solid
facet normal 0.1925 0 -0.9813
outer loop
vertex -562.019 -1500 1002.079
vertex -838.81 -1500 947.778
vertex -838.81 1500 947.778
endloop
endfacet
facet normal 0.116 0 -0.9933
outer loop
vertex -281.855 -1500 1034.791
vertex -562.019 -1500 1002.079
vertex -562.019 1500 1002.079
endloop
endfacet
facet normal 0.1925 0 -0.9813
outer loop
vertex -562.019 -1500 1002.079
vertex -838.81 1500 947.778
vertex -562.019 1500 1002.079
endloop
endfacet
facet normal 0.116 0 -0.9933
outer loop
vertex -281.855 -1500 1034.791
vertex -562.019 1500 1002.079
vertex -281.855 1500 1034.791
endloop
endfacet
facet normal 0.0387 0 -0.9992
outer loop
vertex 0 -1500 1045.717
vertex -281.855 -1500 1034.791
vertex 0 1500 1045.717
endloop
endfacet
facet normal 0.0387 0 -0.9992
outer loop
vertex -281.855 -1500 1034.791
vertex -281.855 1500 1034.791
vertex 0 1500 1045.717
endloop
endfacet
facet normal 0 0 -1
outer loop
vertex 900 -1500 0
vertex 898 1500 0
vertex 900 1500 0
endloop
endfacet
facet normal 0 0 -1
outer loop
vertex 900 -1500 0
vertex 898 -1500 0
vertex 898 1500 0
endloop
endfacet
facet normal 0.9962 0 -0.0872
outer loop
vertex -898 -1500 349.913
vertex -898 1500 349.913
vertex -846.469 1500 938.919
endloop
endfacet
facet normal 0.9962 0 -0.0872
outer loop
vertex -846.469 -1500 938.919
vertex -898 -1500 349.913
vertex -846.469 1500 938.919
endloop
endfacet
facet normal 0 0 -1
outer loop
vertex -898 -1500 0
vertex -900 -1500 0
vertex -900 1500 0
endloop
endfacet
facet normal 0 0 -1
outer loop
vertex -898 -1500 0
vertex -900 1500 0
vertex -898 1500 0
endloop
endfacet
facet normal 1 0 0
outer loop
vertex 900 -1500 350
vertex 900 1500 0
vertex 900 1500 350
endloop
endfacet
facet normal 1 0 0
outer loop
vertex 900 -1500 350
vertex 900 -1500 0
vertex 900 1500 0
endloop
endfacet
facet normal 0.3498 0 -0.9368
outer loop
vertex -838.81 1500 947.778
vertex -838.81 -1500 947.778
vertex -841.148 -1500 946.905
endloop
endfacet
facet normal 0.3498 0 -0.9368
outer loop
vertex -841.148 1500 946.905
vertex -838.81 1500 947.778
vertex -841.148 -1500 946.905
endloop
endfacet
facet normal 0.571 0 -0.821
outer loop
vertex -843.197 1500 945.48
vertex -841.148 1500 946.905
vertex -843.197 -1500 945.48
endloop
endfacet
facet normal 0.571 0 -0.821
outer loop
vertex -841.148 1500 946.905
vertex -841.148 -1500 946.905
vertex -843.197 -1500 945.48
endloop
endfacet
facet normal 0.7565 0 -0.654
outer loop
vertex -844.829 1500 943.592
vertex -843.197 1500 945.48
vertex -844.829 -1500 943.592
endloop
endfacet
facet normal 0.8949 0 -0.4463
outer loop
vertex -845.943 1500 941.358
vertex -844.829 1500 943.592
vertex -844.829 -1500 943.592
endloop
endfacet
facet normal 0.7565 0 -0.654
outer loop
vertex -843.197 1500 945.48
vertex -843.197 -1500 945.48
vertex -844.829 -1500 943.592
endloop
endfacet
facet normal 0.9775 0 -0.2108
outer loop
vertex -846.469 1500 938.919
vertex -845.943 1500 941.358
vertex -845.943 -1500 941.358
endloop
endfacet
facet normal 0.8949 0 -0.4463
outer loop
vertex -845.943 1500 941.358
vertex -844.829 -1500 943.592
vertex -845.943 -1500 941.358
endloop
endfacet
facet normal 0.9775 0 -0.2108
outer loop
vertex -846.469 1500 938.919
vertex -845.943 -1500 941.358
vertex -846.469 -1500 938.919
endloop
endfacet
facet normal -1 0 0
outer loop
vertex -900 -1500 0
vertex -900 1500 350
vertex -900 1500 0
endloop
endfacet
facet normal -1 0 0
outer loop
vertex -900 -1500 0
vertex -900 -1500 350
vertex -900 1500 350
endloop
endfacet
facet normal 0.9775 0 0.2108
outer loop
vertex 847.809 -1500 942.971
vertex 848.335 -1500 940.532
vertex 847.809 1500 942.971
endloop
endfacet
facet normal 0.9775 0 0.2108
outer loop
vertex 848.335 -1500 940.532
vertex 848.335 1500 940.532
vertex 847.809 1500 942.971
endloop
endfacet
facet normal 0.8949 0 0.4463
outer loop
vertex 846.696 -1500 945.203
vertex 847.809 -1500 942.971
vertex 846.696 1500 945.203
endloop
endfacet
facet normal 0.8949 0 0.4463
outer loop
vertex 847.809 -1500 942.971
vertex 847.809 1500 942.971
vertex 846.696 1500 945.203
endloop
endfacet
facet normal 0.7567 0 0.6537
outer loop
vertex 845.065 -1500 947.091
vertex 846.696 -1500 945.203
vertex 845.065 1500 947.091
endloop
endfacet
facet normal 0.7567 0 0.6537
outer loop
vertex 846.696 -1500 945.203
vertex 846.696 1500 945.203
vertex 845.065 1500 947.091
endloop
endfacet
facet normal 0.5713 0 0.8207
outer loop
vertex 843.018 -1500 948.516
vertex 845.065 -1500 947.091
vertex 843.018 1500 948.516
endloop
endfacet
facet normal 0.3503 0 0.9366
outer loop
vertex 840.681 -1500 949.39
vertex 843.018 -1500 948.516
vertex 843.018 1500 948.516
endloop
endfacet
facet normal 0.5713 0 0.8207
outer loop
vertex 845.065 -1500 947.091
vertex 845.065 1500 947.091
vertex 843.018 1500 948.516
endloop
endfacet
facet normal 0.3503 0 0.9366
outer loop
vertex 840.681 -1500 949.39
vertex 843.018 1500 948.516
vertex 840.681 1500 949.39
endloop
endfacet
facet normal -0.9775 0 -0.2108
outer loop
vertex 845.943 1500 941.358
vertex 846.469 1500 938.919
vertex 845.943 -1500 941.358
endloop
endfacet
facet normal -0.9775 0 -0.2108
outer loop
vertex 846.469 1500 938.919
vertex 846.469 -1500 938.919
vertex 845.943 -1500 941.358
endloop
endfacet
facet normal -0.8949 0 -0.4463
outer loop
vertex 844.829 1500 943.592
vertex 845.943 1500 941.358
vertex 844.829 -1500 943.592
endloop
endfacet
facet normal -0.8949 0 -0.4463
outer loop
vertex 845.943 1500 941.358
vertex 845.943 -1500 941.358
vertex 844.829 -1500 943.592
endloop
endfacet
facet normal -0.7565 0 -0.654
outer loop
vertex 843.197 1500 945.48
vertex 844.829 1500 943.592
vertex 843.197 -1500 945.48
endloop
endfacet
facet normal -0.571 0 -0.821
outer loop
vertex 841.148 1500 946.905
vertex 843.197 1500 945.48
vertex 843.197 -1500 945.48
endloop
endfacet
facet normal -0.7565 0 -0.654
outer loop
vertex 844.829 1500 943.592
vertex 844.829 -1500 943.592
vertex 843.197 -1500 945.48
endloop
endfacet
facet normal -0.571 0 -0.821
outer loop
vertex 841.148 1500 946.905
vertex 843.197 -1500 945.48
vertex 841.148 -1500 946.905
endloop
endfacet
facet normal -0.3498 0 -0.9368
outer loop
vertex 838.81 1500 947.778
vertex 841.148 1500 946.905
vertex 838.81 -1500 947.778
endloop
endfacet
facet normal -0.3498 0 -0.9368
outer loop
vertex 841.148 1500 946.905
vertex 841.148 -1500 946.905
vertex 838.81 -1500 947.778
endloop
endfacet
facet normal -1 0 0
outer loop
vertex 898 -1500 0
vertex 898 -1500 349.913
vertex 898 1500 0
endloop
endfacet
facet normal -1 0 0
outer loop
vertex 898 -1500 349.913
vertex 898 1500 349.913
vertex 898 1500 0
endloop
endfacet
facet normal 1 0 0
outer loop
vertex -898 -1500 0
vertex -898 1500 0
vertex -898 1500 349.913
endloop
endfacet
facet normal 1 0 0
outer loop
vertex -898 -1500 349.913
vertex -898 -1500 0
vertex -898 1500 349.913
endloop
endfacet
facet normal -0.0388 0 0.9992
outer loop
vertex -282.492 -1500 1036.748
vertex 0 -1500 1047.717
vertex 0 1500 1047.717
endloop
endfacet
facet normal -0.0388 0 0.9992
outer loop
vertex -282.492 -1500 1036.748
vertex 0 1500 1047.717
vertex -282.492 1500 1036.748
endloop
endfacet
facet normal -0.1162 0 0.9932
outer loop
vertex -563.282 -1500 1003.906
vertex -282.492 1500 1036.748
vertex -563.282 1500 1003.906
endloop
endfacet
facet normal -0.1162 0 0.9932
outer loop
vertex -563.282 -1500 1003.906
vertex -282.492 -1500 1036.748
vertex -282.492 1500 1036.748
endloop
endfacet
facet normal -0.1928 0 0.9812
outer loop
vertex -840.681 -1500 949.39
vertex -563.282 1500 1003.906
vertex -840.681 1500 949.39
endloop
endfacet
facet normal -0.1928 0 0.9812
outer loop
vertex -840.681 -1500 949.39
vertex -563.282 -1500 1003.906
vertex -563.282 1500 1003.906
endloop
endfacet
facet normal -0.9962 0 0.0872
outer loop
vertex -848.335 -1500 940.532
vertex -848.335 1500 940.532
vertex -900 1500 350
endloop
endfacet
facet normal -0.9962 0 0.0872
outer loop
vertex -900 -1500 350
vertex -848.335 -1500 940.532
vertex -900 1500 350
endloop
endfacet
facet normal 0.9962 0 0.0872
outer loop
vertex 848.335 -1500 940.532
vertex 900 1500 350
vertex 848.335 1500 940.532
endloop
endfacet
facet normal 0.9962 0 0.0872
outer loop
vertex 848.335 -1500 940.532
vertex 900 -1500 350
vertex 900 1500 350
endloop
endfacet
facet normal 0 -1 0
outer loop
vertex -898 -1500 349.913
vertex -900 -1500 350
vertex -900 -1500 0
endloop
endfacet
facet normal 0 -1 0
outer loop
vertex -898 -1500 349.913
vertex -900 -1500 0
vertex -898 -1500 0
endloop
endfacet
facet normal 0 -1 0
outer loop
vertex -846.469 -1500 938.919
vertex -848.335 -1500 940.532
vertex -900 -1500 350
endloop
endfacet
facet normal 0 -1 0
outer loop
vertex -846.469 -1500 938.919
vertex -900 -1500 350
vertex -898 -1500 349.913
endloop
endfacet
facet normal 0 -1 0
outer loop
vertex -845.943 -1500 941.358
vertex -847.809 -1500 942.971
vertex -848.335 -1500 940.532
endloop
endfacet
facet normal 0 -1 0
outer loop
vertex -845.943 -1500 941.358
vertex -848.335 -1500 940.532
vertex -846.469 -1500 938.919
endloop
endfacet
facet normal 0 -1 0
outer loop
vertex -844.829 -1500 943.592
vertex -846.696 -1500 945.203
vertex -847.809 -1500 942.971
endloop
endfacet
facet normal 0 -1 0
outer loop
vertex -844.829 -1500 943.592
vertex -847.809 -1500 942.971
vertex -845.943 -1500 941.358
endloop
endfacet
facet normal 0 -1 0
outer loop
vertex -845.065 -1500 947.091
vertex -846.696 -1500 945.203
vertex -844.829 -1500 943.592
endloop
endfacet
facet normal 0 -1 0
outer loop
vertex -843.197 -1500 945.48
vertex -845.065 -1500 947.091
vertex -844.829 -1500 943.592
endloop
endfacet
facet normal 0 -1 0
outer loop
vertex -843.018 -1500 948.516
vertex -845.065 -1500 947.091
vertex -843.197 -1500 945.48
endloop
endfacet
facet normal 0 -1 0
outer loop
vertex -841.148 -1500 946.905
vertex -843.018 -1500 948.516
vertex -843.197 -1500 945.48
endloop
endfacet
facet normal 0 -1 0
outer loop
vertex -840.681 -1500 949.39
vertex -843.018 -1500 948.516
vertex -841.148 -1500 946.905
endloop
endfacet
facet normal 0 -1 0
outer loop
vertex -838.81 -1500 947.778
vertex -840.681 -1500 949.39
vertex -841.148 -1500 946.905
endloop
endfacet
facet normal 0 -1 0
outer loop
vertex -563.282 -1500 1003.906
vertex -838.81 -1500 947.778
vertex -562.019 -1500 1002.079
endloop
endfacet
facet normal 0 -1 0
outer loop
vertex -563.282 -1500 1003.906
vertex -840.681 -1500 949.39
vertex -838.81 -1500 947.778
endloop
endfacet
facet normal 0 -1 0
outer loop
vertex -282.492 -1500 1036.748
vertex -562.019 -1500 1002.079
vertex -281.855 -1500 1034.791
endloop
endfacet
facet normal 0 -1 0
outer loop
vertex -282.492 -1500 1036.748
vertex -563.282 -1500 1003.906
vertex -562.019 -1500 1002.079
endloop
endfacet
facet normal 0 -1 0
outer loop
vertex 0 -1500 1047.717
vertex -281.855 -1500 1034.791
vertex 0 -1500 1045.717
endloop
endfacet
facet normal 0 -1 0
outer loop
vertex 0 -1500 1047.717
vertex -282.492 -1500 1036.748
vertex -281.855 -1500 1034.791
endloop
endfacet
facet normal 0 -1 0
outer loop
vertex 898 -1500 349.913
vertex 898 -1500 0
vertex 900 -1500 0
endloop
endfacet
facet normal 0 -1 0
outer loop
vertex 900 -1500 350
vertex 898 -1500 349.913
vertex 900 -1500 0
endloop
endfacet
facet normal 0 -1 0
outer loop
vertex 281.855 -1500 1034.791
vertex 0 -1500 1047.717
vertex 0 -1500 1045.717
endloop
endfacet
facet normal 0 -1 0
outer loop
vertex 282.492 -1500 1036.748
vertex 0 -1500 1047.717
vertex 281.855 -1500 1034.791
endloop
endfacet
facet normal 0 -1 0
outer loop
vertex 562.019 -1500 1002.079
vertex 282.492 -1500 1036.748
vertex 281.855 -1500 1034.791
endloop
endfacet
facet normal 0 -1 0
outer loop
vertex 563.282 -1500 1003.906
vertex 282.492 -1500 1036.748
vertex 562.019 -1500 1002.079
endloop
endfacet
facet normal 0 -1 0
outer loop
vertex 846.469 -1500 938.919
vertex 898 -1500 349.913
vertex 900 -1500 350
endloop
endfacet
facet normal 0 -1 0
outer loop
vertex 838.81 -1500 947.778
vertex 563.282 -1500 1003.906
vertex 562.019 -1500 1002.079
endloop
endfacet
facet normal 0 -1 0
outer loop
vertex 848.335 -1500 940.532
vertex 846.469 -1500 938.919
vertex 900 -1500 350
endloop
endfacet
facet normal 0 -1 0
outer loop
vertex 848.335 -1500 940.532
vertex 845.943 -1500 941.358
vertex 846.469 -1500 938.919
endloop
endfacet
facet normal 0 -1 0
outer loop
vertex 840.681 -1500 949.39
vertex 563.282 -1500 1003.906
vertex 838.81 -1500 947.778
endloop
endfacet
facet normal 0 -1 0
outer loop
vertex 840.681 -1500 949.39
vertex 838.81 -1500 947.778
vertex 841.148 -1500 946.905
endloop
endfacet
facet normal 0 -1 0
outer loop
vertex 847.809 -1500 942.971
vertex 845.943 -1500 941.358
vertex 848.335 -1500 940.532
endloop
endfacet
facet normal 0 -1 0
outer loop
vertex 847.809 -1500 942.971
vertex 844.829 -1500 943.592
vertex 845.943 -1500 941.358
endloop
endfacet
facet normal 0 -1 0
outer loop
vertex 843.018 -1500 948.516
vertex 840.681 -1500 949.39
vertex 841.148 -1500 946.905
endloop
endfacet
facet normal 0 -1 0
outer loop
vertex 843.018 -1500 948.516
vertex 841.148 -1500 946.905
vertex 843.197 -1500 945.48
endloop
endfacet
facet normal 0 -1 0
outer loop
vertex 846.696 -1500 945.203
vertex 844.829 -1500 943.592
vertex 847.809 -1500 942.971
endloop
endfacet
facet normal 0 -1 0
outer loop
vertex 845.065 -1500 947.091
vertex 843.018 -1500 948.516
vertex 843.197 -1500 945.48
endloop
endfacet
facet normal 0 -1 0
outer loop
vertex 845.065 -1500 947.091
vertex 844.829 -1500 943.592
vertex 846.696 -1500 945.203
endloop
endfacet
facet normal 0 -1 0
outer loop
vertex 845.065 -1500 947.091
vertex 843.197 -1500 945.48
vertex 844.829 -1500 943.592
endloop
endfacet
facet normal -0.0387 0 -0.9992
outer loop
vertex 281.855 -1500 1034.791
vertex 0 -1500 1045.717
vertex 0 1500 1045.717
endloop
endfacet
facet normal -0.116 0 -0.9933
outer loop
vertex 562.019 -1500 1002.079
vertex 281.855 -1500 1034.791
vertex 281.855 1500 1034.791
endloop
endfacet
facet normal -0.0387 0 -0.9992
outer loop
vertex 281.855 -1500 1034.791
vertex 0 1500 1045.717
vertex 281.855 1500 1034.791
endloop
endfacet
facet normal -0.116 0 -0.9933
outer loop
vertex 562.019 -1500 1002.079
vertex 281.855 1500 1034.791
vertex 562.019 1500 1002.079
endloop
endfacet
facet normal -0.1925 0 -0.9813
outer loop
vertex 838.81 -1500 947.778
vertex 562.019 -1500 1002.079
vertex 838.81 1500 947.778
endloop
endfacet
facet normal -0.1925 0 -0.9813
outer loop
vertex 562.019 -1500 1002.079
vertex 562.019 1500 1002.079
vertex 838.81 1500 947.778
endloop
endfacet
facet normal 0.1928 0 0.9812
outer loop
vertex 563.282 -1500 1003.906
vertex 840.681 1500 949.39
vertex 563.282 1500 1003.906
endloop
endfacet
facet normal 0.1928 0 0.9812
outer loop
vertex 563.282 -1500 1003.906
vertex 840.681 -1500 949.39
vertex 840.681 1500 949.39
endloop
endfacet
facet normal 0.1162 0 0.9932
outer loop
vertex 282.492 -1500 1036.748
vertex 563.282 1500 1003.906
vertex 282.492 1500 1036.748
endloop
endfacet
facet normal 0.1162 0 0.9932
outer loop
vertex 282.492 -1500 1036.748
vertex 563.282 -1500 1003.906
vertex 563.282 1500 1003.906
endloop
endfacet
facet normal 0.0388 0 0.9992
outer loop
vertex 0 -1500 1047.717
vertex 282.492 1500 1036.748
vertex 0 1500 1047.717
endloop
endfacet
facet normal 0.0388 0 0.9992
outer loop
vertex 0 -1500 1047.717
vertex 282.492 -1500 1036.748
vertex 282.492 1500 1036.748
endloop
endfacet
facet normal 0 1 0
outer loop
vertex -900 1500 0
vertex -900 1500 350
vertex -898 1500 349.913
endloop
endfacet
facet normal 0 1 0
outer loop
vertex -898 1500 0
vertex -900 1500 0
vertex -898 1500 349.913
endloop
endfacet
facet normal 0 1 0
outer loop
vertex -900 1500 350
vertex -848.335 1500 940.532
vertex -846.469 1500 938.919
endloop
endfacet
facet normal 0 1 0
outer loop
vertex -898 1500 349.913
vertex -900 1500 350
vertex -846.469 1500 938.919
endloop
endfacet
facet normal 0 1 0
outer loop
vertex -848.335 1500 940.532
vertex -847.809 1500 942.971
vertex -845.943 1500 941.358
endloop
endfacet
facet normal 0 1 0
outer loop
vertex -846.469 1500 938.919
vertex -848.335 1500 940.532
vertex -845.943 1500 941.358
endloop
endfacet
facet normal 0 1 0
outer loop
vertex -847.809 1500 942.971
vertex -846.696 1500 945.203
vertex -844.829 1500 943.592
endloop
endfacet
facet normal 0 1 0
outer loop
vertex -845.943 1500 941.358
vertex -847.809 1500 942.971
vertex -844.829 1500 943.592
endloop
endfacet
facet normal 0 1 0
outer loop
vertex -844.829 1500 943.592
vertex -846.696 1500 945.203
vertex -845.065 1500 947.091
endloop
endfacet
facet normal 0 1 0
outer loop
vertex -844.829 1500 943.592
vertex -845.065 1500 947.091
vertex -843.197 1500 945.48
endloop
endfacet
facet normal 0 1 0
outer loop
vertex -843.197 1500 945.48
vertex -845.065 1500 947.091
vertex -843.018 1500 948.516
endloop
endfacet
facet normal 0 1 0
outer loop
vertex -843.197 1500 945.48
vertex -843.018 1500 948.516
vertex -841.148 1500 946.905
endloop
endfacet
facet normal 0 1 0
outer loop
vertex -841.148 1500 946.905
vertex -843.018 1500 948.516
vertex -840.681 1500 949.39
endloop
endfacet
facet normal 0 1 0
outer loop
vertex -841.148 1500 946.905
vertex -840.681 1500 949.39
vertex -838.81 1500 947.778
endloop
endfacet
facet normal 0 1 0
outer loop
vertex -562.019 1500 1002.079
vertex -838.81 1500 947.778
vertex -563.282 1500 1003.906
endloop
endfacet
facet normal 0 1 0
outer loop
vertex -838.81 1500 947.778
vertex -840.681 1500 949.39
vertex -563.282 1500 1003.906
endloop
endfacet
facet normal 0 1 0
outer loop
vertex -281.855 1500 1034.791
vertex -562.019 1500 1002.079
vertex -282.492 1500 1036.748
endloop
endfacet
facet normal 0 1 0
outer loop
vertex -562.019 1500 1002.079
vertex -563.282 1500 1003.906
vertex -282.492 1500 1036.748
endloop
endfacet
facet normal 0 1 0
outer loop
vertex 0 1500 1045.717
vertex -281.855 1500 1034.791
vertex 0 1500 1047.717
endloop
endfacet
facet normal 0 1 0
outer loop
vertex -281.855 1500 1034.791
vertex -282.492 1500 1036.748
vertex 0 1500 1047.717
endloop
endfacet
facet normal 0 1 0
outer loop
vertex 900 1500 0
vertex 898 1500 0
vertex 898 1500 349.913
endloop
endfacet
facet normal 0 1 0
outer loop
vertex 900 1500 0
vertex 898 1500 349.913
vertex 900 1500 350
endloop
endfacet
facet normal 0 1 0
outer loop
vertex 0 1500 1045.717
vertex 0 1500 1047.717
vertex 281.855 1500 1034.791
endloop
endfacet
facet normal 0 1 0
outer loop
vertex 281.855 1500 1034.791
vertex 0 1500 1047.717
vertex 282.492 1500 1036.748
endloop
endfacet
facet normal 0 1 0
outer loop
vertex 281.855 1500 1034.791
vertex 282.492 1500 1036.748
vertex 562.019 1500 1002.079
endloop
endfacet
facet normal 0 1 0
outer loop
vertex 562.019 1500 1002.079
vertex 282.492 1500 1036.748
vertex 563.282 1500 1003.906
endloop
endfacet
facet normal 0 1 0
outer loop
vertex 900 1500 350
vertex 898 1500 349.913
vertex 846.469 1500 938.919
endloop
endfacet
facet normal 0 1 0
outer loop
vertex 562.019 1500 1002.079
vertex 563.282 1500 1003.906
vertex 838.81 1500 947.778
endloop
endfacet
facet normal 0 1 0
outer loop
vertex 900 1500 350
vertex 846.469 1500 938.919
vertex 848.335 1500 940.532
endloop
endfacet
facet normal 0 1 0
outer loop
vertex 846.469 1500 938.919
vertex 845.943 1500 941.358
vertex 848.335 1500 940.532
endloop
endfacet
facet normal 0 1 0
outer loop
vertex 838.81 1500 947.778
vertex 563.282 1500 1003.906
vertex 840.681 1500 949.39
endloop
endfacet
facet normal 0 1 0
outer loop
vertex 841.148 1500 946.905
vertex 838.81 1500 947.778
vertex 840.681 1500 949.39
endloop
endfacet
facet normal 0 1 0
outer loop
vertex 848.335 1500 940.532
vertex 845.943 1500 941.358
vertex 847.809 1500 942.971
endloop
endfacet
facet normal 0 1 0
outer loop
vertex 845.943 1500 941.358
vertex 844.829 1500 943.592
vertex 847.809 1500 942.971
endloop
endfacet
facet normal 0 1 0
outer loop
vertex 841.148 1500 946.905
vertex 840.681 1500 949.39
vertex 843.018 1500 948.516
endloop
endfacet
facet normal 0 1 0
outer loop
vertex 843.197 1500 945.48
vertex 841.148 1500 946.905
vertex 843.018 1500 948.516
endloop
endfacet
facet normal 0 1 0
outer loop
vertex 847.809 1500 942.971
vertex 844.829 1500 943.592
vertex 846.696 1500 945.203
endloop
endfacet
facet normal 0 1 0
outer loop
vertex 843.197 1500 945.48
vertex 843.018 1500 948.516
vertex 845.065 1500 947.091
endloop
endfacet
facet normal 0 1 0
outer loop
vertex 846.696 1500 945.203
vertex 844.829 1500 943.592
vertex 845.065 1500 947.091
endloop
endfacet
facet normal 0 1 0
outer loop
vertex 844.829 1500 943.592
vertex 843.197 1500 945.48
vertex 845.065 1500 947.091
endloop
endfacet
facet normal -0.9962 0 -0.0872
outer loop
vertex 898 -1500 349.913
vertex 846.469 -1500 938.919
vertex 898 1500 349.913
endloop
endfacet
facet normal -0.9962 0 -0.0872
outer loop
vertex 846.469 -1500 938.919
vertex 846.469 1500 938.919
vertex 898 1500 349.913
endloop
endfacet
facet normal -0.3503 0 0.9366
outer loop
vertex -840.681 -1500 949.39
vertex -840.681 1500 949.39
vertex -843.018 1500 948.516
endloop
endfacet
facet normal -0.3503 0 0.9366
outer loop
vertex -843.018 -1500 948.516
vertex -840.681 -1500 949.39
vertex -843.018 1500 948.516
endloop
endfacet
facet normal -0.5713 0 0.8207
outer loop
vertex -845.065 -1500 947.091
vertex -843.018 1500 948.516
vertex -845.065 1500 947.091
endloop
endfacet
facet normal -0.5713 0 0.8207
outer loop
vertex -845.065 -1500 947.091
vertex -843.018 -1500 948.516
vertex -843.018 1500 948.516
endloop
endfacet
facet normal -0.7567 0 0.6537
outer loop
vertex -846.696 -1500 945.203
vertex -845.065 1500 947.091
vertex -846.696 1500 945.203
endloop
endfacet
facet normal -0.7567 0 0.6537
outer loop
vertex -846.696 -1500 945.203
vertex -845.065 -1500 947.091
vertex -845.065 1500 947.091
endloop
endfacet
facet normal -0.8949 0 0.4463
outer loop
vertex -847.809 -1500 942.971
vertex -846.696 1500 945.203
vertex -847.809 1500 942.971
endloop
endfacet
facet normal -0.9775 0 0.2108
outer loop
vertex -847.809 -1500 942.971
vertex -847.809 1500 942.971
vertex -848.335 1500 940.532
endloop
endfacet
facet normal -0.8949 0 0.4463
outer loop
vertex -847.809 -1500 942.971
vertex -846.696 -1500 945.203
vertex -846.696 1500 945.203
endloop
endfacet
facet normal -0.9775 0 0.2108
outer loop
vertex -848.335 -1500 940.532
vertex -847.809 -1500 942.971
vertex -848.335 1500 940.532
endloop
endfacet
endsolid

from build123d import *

# Parameters (mm, degrees)
F2_DEPTH      = 1500
F2_DEPTH_BACK = 1500
F3_R          = 10
F4_R          = 10
F5_R          = 10
F6_R          = 10


with BuildPart() as f2:
    # F1 (on Front) → F2 (new body, two sides)
    with BuildSketch(Plane.XZ) as f2_sk:
        with BuildLine():
            Line((-900, 350), (-900, 0))
            Line((-900, 0), (-898, 0))
            Line((-898, 0), (-898, 349.912678))
            Line((-898, 349.912678), (-845.83978, 946.106722))
            ThreePointArc((-845.83978, 946.106722), (-425.842431, 1020.728548), (0, 1045.716819))
            ThreePointArc((0, 1045.716819), (425.842431, 1020.728548), (845.83978, 946.106722))
            Line((845.83978, 946.106722), (898, 349.912678))
            Line((898, 349.912678), (898, 0))
            Line((898, 0), (900, 0))
            Line((900, 0), (900, 350))
            Line((900, 350), (847.706554, 947.716819))
            ThreePointArc((847.706554, 947.716819), (426.792222, 1022.630445), (0, 1047.716819))
            ThreePointArc((0, 1047.716819), (-426.792222, 1022.630445), (-847.706554, 947.716819))
            Line((-847.706554, 947.716819), (-900, 350))
        make_face()
    extrude(amount=F2_DEPTH)
    extrude(f2_sk.sketch, amount=-F2_DEPTH_BACK)

    # F3
    f3_edges = [f2.edges().sort_by_distance(p)[0] for p in [
        (-845.83978, 0, 946.106722),
    ]]
    fillet(f3_edges, radius=F3_R)

    # F4
    f4_edges = [f2.edges().sort_by_distance(p)[0] for p in [
        (-847.706554, 0, 947.716819),
    ]]
    fillet(f4_edges, radius=F4_R)

    # F5
    f5_edges = [f2.edges().sort_by_distance(p)[0] for p in [
        (847.706554, 0, 947.716819),
    ]]
    fillet(f5_edges, radius=F5_R)

    # F6
    f6_edges = [f2.edges().sort_by_distance(p)[0] for p in [
        (845.83978, 0, 946.106722),
    ]]
    fillet(f6_edges, radius=F6_R)


solid = f2.part
